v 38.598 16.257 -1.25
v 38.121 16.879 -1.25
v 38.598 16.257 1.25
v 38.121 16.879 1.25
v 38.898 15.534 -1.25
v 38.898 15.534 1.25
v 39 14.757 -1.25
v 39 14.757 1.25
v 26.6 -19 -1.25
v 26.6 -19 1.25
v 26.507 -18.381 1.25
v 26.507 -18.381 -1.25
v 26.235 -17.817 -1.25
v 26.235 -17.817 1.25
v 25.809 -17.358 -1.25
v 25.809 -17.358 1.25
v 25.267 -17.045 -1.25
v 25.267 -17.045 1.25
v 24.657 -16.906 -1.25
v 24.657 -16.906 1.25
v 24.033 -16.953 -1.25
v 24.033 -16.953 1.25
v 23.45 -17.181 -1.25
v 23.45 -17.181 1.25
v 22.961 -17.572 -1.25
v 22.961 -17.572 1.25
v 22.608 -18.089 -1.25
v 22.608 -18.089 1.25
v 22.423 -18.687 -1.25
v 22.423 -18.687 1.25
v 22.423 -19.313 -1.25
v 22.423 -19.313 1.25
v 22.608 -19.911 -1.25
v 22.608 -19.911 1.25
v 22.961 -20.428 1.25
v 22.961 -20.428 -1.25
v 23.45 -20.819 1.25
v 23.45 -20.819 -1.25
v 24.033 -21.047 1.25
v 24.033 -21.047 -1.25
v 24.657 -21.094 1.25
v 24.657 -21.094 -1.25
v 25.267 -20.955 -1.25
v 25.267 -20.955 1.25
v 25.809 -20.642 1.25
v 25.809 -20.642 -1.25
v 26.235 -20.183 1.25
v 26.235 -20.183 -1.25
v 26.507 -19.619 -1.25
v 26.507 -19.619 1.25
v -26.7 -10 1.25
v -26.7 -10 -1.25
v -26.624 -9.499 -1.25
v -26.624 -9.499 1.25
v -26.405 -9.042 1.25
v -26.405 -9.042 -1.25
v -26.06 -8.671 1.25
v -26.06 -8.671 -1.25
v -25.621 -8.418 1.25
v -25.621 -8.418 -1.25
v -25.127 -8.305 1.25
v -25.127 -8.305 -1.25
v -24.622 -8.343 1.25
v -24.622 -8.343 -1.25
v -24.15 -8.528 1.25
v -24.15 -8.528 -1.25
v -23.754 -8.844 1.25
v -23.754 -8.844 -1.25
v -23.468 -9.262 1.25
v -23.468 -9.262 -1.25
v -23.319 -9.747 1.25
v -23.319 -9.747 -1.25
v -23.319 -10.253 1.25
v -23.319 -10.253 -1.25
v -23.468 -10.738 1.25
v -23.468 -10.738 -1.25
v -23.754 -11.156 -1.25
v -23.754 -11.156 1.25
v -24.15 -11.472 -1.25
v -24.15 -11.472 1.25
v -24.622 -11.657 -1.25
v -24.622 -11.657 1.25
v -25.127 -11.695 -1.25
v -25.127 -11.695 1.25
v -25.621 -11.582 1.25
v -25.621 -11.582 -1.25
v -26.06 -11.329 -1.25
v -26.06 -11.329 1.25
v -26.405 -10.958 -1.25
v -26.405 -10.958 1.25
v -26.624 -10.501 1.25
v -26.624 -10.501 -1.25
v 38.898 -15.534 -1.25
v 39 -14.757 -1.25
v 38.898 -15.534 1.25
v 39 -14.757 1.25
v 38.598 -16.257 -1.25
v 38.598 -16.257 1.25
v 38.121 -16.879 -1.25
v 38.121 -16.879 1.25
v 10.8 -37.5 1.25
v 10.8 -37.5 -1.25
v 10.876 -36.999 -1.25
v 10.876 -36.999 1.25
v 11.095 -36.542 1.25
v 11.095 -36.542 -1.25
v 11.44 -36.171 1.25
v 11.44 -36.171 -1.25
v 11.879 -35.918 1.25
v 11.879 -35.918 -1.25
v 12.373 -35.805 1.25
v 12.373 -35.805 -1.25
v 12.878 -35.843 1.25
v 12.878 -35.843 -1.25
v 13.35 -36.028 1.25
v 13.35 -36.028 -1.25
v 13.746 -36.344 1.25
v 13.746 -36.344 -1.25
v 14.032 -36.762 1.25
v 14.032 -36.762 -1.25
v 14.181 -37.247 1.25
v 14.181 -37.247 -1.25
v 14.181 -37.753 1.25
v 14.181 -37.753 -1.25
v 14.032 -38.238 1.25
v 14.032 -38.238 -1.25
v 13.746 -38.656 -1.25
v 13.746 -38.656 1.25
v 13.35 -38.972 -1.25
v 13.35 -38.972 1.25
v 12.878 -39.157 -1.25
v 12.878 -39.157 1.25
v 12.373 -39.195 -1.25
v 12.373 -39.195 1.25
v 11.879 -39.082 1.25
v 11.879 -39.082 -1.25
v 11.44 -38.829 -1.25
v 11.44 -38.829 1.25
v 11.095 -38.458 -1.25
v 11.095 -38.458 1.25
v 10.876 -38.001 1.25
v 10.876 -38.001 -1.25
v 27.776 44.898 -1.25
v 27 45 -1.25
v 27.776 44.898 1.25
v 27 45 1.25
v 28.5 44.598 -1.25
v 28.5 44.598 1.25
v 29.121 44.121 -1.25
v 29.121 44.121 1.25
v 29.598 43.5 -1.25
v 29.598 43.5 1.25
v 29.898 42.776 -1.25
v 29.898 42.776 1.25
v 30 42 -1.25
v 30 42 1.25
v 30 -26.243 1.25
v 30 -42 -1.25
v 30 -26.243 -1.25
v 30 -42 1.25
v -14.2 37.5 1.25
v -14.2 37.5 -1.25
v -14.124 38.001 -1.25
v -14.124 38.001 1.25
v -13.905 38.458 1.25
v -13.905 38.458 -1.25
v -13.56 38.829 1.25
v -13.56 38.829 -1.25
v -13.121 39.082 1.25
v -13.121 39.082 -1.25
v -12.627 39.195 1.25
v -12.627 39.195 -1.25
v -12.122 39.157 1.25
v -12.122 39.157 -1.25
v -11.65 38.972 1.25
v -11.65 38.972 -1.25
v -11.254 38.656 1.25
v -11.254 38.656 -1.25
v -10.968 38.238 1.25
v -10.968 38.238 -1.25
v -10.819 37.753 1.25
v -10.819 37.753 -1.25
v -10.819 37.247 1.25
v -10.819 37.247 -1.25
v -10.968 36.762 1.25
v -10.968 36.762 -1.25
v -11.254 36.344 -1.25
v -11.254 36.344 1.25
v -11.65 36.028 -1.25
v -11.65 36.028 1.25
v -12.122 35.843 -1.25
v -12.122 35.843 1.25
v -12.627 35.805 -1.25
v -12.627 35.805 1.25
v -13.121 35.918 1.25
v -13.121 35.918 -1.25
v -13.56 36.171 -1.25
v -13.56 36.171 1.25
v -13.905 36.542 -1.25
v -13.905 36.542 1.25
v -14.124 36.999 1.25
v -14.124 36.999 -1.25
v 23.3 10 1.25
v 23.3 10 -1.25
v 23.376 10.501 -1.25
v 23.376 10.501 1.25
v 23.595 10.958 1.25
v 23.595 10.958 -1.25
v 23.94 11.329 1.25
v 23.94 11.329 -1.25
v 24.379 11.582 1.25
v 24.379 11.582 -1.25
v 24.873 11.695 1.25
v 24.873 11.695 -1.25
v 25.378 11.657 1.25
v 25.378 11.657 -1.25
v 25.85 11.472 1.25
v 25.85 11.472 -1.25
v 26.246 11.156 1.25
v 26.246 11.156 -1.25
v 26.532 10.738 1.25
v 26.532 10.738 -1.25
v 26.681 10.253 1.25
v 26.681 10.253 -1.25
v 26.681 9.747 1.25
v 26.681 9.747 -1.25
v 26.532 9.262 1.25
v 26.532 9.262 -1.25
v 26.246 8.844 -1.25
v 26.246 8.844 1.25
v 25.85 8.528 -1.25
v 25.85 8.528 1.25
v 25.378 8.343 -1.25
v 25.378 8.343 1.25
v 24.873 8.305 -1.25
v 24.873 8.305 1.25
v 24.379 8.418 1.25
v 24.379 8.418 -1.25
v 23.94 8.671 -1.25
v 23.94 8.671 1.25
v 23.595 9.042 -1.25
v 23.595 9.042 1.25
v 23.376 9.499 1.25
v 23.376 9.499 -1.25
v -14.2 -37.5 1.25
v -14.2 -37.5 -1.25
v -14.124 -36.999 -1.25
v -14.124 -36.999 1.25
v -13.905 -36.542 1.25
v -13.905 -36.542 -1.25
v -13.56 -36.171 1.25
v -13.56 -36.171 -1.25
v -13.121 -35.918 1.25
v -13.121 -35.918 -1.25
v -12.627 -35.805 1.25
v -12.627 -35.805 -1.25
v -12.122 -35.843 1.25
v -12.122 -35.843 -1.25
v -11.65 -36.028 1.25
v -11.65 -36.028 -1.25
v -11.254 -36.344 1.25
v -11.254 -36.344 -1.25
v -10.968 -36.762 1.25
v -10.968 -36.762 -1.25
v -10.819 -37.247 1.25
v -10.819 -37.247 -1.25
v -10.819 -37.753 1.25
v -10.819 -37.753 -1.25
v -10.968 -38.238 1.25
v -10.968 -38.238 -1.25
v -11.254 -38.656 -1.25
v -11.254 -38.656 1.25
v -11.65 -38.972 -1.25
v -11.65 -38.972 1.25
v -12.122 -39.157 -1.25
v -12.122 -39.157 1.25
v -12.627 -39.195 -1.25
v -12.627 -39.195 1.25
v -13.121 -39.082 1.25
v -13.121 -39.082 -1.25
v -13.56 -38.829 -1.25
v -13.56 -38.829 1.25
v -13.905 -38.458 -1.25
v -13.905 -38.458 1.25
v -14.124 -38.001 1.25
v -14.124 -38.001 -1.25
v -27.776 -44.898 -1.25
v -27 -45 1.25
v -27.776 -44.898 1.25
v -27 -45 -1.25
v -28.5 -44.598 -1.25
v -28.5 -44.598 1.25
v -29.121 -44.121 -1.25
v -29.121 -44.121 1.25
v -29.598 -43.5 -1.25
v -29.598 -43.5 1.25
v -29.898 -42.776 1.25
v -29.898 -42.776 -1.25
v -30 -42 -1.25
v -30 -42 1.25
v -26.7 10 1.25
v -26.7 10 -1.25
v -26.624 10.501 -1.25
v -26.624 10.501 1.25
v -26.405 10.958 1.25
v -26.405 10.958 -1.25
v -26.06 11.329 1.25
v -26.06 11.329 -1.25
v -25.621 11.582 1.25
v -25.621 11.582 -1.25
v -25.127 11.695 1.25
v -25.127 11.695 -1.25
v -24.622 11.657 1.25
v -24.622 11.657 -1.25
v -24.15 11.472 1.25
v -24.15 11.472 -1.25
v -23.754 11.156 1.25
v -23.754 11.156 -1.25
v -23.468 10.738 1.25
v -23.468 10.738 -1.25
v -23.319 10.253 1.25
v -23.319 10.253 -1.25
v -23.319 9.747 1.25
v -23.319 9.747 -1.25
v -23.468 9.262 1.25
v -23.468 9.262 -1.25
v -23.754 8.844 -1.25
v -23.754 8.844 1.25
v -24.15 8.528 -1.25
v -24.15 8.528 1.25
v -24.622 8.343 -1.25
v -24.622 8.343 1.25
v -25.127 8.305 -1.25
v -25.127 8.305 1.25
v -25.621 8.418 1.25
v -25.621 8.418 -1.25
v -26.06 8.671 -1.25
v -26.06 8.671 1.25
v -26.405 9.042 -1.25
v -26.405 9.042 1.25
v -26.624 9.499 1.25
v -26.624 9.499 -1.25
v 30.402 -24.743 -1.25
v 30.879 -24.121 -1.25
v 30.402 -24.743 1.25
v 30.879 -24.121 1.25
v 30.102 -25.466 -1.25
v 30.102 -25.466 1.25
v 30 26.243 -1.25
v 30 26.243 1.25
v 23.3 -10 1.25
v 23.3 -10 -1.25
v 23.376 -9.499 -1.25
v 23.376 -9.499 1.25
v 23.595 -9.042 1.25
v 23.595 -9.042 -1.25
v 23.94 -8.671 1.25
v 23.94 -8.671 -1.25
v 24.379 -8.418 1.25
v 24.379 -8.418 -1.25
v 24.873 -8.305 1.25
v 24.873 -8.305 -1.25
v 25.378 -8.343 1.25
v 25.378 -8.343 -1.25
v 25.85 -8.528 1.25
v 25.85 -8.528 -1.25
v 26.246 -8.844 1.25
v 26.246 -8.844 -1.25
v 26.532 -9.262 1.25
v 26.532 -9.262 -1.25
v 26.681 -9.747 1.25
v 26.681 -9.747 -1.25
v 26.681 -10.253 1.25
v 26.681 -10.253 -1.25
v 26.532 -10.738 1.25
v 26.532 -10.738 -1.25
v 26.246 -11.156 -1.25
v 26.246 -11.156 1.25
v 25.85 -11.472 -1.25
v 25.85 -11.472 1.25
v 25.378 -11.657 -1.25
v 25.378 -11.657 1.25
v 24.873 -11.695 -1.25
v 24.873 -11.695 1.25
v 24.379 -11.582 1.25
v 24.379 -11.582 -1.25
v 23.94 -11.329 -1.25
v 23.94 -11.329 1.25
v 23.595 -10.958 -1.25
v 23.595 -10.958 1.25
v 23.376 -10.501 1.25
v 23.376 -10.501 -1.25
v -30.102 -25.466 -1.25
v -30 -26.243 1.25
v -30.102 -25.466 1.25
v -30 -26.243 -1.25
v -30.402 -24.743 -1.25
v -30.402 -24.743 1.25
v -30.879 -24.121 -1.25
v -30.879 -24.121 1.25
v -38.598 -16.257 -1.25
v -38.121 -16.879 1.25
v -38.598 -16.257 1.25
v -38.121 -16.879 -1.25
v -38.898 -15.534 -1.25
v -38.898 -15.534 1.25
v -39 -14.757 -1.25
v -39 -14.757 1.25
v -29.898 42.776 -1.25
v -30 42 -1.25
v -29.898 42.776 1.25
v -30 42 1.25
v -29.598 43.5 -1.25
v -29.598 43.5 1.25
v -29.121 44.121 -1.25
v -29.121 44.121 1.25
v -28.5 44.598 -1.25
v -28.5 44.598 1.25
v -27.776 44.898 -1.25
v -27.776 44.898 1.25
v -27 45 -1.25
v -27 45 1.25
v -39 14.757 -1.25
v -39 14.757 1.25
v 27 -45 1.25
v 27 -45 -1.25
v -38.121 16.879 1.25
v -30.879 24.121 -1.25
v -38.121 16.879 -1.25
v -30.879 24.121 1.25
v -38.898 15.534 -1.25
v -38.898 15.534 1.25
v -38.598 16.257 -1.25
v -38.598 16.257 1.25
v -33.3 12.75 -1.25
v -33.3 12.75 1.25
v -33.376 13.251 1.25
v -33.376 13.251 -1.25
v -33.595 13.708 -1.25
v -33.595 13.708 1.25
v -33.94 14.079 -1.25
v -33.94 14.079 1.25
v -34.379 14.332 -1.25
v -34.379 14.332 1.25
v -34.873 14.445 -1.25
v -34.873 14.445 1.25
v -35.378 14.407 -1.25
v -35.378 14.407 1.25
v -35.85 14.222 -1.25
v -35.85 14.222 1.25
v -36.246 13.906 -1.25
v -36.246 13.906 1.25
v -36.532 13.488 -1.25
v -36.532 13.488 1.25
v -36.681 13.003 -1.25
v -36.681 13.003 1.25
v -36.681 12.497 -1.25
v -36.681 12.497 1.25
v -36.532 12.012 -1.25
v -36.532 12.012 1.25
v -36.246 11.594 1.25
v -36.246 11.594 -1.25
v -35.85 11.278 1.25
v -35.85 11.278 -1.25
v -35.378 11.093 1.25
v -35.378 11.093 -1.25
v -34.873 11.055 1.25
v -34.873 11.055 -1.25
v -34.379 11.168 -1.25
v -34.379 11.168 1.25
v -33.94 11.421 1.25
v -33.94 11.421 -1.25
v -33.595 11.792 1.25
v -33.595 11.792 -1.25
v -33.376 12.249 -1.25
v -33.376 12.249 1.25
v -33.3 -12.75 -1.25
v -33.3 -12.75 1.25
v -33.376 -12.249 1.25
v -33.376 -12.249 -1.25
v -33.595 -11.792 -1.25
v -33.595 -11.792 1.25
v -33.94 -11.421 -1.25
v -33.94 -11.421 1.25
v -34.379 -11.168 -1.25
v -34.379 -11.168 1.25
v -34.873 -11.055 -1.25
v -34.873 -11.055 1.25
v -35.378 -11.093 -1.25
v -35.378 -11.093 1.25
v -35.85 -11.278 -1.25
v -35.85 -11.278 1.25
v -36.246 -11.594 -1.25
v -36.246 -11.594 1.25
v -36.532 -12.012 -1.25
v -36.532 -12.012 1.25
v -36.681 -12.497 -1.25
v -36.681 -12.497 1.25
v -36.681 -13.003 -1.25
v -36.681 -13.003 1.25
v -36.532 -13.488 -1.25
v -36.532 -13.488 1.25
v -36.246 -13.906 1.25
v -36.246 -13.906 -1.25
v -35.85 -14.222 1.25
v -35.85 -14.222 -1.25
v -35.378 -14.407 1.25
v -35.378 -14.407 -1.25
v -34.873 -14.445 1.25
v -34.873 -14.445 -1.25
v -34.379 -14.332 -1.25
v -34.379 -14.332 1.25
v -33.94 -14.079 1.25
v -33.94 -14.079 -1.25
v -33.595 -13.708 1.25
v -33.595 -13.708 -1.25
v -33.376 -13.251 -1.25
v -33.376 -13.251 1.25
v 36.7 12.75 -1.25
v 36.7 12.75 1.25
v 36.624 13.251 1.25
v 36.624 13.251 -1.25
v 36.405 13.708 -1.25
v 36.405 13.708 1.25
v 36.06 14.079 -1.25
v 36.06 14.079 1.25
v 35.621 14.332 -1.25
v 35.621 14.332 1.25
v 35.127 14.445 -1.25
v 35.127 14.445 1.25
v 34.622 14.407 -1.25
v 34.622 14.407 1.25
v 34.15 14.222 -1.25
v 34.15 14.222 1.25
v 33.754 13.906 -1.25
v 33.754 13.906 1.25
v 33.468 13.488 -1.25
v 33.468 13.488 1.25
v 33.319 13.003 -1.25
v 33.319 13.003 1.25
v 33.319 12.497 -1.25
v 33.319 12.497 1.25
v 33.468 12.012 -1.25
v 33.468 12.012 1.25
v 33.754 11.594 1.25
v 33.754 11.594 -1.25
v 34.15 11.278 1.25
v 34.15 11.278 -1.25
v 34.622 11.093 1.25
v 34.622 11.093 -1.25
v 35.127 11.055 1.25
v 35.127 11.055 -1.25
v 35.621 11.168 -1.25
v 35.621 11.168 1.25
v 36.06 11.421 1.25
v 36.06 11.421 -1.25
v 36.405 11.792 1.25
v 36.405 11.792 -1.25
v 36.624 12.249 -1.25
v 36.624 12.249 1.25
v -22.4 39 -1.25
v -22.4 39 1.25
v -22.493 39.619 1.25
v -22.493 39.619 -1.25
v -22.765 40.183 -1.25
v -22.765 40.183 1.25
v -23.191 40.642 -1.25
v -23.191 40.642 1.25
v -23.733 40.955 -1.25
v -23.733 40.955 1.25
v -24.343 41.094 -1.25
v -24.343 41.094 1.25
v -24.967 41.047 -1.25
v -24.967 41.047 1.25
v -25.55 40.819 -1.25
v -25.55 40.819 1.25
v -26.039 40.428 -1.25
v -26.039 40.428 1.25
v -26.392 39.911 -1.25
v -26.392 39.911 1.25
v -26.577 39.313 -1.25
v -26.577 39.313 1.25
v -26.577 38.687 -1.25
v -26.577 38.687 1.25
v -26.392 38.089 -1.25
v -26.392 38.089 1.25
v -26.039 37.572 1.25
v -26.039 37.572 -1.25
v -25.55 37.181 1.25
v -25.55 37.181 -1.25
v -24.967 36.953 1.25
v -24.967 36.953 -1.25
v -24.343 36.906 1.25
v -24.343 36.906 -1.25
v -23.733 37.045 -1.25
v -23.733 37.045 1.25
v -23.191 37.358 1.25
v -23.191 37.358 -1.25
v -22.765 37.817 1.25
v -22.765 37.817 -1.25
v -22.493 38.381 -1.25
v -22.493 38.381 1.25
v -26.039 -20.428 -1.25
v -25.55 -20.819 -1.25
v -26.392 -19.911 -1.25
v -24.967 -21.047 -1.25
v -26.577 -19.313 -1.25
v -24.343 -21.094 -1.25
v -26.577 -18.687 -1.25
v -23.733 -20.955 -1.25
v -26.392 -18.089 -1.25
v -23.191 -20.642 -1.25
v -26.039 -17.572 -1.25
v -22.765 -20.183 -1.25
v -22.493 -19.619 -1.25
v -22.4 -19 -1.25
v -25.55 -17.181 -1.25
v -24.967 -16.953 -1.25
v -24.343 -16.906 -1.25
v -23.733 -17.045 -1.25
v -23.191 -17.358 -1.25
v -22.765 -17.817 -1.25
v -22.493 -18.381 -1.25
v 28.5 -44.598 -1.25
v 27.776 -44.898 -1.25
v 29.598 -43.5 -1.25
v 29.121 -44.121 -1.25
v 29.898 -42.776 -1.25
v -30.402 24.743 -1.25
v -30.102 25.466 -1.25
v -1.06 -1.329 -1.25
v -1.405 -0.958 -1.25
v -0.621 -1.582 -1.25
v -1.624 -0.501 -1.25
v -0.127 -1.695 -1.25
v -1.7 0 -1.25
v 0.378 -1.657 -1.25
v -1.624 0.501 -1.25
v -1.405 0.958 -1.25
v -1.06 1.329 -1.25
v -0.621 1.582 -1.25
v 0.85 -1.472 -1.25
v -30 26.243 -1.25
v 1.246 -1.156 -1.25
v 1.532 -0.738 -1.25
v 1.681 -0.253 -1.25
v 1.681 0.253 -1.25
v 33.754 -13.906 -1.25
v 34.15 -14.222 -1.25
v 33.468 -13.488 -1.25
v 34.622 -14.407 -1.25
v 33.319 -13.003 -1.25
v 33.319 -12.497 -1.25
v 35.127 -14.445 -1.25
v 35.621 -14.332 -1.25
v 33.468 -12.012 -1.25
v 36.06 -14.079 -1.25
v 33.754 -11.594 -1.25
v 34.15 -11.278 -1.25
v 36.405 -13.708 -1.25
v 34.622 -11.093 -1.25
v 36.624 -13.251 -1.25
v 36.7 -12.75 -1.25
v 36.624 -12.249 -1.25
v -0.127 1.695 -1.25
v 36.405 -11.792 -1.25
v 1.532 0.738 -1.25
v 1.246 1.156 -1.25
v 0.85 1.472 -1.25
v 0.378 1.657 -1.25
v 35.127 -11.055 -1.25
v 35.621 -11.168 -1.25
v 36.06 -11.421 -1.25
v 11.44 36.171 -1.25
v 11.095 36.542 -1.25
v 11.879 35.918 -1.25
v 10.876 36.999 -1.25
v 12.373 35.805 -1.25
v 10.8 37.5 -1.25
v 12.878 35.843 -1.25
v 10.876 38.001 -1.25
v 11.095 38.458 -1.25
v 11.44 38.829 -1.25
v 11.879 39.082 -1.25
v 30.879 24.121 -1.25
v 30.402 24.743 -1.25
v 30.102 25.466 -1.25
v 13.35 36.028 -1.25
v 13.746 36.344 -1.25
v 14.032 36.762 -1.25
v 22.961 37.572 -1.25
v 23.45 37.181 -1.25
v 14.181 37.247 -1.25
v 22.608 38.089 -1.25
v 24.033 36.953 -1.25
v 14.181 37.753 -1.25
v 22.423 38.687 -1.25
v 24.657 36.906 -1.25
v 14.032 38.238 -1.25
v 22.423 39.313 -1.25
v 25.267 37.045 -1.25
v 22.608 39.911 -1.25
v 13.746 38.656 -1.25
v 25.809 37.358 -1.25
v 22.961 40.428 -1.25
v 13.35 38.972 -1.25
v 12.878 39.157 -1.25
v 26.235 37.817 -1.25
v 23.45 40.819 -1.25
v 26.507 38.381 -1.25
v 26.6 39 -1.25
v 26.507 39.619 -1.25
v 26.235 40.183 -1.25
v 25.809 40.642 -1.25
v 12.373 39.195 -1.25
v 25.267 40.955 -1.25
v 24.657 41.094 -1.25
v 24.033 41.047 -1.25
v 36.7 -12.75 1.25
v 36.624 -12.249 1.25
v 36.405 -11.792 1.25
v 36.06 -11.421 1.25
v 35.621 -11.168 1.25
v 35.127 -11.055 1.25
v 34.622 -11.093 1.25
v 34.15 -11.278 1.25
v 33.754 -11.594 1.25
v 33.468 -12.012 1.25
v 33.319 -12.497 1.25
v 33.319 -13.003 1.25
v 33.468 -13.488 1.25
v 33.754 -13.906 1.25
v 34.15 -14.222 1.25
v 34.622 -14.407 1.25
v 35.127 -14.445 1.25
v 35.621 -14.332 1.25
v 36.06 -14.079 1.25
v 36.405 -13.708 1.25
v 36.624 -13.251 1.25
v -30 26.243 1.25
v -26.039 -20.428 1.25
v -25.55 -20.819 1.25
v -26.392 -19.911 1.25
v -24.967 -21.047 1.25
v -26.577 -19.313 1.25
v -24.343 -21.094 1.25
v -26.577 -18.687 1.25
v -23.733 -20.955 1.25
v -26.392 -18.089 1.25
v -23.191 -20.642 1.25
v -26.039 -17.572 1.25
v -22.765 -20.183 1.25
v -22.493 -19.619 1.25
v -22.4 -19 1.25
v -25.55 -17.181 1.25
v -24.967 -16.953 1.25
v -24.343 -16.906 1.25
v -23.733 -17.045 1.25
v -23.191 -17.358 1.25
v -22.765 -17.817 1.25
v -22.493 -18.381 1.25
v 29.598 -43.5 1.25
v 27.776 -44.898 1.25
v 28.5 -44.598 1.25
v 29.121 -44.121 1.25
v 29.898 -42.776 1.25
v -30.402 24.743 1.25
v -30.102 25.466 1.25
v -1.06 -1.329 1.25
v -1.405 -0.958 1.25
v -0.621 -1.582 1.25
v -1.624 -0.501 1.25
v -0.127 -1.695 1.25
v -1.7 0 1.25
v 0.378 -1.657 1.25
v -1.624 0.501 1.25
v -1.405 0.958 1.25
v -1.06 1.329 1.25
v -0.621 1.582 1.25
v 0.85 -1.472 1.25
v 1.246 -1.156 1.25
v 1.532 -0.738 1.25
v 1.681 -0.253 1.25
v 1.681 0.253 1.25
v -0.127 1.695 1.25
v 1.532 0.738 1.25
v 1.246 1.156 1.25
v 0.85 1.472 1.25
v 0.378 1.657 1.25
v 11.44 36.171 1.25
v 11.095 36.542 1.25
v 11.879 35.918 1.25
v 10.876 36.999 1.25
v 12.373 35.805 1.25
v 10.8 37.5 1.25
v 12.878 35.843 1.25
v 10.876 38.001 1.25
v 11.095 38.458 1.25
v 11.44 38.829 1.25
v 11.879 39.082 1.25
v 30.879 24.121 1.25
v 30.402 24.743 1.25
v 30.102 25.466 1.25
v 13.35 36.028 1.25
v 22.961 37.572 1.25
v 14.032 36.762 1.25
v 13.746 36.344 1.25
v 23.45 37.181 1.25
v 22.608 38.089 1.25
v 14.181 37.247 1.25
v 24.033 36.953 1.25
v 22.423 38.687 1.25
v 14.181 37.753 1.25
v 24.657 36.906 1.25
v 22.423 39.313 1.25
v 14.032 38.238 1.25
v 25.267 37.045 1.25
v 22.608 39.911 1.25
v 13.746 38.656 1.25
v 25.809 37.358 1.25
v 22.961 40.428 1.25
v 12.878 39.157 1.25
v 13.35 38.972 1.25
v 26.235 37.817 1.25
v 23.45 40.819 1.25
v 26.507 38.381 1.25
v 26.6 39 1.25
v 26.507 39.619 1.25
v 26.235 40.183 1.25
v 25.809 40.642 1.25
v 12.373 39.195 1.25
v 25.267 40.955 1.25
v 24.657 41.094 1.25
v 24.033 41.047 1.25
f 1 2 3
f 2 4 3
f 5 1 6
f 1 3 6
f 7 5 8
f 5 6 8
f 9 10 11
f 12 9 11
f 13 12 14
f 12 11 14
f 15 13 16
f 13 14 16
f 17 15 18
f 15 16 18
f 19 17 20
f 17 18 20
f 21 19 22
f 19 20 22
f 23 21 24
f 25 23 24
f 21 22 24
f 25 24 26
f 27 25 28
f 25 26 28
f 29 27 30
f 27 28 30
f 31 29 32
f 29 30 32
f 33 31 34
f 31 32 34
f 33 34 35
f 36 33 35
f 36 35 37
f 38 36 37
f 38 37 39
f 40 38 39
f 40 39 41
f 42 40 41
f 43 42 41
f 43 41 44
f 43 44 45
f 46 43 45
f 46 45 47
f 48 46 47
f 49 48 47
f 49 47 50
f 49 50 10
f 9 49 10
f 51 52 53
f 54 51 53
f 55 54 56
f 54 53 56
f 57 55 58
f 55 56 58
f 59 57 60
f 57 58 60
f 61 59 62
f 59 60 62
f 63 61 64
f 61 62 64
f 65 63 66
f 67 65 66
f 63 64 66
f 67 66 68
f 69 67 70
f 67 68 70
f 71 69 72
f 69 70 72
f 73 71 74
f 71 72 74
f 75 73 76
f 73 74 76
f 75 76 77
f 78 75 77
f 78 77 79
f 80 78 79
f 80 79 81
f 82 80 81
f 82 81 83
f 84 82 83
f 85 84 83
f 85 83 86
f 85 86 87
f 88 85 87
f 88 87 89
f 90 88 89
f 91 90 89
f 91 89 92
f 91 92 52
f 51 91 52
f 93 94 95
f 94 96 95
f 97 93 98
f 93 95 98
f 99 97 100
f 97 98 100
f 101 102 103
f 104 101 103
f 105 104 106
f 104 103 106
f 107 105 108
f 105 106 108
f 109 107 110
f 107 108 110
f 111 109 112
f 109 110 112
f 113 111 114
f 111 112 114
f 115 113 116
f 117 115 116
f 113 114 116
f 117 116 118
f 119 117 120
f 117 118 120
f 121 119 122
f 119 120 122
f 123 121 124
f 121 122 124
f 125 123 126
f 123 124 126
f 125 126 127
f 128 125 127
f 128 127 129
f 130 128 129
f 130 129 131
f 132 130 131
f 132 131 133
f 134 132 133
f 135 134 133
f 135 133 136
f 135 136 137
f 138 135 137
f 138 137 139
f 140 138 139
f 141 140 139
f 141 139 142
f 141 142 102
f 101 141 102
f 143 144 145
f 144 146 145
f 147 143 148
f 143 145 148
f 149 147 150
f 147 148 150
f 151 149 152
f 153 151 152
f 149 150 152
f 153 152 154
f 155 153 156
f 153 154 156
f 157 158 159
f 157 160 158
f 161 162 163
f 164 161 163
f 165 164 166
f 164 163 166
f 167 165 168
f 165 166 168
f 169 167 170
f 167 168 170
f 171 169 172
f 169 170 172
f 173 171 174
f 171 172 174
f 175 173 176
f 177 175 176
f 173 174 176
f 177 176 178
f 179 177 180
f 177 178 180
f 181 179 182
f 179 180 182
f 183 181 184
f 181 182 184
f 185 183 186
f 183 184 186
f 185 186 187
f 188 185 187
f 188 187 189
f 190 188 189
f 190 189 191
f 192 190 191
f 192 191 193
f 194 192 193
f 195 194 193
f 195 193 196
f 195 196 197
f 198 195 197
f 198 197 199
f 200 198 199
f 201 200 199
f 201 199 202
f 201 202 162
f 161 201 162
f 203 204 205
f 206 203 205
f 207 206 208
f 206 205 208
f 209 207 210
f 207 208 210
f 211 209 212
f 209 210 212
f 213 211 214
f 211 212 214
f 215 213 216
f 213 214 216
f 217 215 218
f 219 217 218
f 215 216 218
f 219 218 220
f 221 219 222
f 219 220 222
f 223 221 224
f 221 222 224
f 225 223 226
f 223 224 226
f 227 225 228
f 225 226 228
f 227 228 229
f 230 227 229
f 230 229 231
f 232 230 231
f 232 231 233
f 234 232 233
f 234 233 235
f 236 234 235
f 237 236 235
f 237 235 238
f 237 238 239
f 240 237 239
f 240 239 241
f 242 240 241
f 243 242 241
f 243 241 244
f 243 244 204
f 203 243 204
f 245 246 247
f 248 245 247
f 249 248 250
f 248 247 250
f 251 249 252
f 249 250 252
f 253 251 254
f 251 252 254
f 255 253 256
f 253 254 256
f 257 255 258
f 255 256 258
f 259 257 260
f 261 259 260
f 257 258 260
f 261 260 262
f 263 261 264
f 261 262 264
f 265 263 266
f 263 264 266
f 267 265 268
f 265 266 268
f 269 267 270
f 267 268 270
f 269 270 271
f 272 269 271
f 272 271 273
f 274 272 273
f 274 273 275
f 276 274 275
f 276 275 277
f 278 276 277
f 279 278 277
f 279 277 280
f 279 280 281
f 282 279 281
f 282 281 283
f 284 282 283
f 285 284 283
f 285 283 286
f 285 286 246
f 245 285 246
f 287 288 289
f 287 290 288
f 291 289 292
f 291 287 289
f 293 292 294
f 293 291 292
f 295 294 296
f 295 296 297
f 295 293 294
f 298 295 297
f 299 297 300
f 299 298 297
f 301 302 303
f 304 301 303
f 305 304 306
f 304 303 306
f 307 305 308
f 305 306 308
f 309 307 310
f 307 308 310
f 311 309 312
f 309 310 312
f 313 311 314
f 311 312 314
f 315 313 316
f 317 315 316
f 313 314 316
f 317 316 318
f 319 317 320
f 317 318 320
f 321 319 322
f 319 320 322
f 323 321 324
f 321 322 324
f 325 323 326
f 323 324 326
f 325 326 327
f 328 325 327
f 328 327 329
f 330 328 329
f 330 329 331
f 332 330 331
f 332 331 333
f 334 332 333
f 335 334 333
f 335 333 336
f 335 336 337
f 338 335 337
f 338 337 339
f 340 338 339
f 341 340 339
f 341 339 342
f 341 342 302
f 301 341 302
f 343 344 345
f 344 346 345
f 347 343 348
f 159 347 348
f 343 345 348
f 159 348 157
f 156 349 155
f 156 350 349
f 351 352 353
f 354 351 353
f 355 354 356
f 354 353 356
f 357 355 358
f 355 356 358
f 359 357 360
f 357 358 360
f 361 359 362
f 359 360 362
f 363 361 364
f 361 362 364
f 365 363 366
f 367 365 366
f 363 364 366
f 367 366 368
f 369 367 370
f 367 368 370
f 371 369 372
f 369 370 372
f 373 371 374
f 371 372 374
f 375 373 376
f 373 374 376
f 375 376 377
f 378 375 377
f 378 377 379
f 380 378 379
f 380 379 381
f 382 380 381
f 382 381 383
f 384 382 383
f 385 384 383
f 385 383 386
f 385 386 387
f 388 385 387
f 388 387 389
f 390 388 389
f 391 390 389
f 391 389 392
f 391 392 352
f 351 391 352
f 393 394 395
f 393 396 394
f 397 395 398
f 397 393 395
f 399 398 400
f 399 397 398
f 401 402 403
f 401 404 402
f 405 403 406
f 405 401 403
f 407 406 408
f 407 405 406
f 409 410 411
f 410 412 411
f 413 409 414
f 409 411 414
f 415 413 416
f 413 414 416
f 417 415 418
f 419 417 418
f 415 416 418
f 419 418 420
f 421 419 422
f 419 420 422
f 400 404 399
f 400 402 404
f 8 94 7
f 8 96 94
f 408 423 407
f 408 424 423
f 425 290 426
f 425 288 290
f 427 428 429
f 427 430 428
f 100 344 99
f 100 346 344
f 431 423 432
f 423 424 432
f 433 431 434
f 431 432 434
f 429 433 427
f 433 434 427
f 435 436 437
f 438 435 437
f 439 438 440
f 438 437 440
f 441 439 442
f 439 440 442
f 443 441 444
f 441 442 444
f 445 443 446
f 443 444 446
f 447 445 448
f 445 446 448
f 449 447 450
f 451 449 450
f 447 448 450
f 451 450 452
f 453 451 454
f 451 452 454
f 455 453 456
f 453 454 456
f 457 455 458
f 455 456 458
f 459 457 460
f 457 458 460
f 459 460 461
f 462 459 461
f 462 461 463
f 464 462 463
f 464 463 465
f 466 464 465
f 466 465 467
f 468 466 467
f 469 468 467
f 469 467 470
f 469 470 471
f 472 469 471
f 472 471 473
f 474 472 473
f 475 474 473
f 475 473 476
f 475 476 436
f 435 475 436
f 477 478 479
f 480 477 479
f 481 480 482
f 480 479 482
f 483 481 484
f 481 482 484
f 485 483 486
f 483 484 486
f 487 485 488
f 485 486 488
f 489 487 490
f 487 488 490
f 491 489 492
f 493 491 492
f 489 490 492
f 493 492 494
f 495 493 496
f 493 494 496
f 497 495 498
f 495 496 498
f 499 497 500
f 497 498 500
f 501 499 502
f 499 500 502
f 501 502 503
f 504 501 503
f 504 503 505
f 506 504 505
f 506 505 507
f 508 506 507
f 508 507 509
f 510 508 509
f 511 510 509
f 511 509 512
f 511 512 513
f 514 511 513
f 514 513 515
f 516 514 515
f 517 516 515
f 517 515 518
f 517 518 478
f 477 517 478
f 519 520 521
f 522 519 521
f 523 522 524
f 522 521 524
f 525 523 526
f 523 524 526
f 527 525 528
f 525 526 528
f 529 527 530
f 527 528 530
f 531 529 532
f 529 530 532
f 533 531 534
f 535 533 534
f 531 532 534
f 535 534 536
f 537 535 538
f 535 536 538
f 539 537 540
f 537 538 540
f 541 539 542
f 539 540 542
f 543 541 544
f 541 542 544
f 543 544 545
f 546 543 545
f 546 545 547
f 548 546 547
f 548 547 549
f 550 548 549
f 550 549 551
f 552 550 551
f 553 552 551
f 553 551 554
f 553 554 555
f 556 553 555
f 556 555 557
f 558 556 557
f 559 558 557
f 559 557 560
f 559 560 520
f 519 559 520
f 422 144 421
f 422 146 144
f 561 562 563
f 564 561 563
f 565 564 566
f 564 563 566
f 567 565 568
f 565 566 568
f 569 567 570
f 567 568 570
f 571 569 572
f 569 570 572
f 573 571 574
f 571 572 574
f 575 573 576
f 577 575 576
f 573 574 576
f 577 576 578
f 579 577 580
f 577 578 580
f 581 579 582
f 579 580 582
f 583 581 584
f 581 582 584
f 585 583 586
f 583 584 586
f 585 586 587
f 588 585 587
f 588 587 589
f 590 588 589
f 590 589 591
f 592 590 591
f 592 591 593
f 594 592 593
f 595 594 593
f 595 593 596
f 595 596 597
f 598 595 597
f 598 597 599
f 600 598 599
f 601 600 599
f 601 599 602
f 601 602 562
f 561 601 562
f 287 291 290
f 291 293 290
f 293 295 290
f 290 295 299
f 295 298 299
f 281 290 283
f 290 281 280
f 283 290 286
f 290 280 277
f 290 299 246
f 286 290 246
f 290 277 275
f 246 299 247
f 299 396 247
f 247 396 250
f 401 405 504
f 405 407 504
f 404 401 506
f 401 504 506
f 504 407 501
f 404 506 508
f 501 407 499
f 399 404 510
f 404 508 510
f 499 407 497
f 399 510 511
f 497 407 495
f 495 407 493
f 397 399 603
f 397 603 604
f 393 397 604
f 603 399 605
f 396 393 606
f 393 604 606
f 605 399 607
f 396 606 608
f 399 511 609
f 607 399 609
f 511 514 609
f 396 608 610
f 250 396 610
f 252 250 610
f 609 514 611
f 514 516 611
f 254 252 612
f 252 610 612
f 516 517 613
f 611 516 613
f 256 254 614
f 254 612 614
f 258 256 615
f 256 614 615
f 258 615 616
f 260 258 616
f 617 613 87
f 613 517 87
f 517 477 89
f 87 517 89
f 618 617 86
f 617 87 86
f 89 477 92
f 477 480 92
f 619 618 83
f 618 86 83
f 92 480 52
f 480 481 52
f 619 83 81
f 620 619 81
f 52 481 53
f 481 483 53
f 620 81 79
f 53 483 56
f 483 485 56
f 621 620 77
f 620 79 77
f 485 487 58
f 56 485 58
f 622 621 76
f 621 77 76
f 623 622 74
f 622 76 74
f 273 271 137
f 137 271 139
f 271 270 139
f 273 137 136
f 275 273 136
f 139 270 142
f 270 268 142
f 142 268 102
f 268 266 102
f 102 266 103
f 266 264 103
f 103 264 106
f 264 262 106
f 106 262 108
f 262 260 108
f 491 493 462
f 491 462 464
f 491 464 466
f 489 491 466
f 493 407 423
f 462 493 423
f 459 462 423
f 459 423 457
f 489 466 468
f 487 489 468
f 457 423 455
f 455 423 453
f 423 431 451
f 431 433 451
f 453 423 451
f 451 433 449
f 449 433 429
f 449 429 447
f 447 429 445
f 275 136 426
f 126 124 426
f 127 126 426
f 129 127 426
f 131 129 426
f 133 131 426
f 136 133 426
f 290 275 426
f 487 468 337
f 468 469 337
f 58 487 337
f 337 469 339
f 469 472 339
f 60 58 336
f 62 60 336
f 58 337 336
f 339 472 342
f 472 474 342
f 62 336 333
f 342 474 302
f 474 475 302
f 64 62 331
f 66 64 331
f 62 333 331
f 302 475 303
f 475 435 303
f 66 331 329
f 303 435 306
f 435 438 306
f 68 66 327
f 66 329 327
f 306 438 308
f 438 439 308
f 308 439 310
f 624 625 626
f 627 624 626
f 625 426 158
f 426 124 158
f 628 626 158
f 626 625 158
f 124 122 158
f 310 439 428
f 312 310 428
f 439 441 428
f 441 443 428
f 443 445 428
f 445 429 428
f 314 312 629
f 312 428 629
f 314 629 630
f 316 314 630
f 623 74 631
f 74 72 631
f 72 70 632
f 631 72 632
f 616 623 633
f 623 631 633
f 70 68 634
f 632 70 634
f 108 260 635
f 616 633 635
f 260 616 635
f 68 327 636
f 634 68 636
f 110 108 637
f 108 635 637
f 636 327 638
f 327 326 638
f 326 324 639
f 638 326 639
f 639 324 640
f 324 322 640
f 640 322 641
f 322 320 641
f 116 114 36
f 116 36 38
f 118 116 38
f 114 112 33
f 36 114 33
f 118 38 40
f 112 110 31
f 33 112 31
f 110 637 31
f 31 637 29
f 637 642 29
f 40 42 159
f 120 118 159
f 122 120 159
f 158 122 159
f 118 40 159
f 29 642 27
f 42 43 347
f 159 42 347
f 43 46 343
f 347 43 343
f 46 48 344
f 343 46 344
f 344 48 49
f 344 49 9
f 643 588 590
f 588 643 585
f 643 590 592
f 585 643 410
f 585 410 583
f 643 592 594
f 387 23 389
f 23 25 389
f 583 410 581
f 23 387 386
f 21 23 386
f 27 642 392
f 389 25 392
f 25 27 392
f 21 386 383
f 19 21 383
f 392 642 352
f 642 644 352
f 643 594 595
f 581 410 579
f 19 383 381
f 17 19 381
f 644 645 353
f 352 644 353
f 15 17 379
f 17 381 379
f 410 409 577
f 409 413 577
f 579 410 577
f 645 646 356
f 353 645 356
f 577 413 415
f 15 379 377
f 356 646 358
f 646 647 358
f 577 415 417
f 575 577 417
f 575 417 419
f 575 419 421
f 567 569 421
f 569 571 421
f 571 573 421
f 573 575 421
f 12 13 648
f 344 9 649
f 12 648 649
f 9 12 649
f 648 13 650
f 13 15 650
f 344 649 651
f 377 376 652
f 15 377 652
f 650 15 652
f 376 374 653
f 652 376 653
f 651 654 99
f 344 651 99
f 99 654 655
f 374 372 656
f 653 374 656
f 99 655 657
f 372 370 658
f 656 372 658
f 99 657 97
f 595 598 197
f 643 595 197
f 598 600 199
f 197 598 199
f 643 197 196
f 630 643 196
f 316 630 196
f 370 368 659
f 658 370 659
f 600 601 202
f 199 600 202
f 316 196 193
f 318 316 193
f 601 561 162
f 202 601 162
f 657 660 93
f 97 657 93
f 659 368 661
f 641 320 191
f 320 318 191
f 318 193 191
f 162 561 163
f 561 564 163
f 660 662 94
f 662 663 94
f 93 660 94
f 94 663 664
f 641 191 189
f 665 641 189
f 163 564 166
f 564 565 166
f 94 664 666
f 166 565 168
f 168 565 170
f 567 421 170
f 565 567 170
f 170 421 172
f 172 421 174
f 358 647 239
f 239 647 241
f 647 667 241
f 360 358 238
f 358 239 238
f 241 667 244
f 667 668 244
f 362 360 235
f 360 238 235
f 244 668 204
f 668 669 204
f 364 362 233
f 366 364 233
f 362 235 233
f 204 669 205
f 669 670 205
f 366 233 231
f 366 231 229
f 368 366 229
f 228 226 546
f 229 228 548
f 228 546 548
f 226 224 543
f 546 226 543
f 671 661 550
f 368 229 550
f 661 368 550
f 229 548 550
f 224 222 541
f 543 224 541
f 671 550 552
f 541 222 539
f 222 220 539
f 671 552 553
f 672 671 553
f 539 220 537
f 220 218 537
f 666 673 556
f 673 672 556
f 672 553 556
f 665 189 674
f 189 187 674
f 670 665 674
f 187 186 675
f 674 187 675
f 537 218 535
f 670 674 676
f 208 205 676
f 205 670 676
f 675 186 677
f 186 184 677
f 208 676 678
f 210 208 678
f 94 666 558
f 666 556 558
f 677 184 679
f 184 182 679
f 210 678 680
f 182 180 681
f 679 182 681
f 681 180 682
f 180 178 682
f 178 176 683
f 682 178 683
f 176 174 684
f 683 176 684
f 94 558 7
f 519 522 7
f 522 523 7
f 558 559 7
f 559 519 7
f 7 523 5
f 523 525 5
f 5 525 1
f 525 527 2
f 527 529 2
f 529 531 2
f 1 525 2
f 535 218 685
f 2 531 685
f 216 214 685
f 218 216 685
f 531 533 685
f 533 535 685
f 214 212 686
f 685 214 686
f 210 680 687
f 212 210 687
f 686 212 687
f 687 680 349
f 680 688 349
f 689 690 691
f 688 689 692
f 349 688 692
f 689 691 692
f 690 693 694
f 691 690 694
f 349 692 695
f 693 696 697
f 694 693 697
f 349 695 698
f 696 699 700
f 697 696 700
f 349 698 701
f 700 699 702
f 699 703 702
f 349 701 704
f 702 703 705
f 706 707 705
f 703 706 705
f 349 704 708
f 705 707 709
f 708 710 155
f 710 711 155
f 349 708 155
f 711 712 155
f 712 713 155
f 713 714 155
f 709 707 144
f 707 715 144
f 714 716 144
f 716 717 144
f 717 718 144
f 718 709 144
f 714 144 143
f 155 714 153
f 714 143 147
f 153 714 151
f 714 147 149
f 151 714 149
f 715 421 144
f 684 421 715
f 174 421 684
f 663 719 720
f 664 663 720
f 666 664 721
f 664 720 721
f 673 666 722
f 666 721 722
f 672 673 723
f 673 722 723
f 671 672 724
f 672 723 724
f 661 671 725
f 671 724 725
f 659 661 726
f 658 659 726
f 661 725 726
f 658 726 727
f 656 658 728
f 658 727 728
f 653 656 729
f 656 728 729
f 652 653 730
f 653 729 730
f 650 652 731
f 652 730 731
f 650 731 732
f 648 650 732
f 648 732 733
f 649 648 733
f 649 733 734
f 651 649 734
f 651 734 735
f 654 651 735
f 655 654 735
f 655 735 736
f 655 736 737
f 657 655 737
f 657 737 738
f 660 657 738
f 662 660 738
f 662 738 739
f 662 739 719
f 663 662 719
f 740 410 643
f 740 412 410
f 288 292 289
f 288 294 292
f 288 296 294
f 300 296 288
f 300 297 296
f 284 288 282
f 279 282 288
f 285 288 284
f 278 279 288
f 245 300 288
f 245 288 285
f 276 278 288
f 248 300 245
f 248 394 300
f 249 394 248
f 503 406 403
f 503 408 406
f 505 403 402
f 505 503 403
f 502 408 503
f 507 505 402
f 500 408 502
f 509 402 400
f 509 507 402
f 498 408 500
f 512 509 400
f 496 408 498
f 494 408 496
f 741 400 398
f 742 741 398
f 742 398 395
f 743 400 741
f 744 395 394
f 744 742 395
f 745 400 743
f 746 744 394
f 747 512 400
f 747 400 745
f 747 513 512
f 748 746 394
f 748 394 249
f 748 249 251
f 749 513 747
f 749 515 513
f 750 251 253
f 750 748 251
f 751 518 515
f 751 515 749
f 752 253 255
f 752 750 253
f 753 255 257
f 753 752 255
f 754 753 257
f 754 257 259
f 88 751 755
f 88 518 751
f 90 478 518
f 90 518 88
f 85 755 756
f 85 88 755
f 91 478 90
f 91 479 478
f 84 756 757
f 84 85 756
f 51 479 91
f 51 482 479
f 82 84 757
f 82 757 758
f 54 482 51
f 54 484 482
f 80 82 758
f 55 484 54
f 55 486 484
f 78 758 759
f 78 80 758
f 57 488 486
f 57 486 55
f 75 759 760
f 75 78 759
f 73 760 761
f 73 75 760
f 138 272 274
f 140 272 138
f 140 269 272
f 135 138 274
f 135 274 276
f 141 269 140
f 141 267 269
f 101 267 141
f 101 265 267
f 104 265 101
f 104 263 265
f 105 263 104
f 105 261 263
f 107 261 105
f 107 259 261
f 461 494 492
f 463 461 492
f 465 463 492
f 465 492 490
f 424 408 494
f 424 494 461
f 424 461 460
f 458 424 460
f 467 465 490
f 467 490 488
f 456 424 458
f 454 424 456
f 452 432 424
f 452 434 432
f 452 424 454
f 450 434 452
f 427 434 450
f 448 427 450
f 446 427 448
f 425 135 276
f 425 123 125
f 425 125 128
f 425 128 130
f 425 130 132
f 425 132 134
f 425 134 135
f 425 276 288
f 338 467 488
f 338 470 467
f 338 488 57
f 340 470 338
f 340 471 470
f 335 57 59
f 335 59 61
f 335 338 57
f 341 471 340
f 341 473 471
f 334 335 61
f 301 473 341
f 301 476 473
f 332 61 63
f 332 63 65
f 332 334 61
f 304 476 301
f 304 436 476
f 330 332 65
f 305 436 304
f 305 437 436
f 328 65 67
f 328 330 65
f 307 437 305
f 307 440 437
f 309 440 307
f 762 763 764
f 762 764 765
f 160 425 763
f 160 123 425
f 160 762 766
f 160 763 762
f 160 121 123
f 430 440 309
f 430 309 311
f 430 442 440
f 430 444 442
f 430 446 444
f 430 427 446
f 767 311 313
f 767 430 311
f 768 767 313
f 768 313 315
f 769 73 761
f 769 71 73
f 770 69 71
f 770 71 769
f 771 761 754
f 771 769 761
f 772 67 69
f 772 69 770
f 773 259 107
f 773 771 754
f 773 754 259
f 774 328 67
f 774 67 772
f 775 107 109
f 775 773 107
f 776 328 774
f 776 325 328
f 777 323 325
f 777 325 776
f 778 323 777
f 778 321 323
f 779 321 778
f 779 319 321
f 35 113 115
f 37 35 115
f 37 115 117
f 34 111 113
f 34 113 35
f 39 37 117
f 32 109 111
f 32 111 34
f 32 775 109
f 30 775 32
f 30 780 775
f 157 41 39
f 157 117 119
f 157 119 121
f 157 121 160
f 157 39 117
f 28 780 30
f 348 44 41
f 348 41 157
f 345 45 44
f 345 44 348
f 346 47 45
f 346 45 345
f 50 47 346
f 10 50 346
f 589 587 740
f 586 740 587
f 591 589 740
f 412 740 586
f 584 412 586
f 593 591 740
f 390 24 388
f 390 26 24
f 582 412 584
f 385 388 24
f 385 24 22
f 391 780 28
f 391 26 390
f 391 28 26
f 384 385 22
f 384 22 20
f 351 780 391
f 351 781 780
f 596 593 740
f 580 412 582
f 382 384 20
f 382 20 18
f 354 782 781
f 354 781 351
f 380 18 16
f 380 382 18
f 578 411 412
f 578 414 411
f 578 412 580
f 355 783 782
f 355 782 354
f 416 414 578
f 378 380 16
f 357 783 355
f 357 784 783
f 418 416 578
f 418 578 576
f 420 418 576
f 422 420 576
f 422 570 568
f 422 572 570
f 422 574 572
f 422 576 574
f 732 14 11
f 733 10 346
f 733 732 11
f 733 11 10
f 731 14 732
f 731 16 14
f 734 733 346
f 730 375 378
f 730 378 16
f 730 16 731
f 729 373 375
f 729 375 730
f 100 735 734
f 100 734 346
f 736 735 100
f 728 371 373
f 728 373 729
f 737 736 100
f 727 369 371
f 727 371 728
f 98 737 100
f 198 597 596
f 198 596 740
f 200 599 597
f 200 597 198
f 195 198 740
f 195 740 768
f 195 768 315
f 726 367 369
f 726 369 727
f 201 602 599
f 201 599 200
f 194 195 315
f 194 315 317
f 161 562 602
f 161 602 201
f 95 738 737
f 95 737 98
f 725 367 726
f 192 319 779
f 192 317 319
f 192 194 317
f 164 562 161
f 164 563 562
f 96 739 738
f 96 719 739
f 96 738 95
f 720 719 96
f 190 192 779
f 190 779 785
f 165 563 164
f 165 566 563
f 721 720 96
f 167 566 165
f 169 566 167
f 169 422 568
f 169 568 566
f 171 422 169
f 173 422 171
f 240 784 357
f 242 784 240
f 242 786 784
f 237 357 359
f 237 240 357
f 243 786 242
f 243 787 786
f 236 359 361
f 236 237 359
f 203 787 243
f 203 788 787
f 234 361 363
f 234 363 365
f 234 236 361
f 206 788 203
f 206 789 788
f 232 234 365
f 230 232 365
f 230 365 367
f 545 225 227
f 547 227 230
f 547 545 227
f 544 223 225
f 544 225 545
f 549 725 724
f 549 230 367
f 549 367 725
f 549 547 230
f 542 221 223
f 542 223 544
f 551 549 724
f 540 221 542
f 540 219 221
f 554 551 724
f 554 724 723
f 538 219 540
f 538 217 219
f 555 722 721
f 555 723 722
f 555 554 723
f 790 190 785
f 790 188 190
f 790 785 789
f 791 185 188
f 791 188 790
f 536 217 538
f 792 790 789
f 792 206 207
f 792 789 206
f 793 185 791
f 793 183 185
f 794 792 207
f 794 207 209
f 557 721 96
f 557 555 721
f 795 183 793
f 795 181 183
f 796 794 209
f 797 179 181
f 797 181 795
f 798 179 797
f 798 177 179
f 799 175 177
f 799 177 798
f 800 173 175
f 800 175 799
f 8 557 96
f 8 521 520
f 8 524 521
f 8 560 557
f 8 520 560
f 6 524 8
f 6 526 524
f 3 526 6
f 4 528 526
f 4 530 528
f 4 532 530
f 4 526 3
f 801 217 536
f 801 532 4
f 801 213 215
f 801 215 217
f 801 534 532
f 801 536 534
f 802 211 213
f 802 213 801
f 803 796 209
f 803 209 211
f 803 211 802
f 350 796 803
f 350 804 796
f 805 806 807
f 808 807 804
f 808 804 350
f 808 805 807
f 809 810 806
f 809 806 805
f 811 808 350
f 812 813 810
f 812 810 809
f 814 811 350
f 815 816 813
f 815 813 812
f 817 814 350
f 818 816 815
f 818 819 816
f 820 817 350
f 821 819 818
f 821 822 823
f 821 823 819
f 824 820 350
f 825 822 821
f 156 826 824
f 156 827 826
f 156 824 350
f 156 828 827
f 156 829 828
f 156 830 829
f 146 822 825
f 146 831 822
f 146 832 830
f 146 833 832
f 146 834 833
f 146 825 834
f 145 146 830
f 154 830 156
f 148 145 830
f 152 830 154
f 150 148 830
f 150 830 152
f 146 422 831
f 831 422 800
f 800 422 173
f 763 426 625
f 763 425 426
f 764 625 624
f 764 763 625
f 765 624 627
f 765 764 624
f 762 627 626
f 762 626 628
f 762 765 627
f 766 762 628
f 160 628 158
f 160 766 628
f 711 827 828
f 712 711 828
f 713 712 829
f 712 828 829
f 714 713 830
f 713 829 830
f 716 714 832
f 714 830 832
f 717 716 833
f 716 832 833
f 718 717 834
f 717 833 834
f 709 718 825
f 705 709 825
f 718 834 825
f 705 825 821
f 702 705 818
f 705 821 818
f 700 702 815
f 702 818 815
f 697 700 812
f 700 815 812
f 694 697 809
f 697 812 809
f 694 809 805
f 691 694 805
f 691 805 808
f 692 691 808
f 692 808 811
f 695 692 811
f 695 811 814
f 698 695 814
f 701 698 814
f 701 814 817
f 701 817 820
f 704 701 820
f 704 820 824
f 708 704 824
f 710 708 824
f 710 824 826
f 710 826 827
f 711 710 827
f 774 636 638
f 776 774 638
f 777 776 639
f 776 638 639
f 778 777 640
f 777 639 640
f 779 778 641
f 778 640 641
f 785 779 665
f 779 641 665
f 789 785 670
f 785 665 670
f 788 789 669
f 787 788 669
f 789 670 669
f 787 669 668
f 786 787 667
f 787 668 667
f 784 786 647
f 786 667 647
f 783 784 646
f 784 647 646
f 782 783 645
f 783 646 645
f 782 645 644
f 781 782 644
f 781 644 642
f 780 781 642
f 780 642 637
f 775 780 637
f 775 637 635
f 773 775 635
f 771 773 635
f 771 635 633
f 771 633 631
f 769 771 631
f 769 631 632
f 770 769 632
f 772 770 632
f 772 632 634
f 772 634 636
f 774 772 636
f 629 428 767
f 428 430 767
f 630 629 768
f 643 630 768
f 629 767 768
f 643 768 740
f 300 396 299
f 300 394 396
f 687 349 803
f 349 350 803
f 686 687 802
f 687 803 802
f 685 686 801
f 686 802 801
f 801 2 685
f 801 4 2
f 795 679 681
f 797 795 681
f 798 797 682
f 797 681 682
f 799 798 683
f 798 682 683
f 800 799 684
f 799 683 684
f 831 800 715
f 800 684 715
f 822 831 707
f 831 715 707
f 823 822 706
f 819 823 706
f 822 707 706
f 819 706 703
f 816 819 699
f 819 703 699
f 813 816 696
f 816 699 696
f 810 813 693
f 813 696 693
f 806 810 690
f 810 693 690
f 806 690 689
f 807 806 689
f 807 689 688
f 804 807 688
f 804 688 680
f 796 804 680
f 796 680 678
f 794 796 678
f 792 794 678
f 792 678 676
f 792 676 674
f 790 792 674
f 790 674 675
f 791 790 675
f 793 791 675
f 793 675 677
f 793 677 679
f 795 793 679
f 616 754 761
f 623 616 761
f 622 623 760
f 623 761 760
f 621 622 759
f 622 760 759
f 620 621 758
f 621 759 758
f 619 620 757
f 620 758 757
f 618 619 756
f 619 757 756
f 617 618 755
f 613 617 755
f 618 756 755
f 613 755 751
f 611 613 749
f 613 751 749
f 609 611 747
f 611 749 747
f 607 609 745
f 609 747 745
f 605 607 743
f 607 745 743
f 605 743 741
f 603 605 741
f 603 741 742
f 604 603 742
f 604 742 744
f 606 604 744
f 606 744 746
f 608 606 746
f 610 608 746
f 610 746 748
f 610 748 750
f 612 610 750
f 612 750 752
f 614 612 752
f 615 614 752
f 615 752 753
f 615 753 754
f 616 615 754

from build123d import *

# Parameters (mm, degrees)
SKETCH1_W                  = 60
SKETCH1_H                  = 90
BOSS_EXTRUDE1_DEPTH        = 1.25
FILLET1_R                  = 3
F_4_2_4_2_DIAMETER_HOLE1_D = 4.2
M3_CLEARANCE_HOLE1_D       = 3.4
M3_CLEARANCE_HOLE2_D       = 3.4
M3_CLEARANCE_HOLE3_D       = 3.4


with BuildPart() as part:
    # Sketch1 → Boss-Extrude1 (new, symmetric)
    with BuildSketch(Plane.XY):
        Polygon((-30, 25), (-30, -25), (-30, -45), (30, -45), (30, -25), (30, 25), (30, 45), (-30, 45), align=None)
        Rectangle(SKETCH1_W, SKETCH1_H)
        Polygon((-39, 16), (-39, -16), (-30, -25), (-30, 25), align=None)
        Polygon((30, 25), (30, -25), (39, -16), (39, 16), align=None)
    extrude(amount=BOSS_EXTRUDE1_DEPTH, both=True)

    # Fillet1
    fillet1_edges = [part.edges().sort_by_distance(p)[0] for p in [
        (30, 25, 0),
        (39, 16, 0),
        (39, -16, 0),
        (30, -25, 0),
        (30, -45, 0),
        (-30, -45, 0),
        (-30, -25, 0),
        (-39, -16, 0),
        (-39, 16, 0),
        (-30, 25, 0),
        (-30, 45, 0),
        (30, 45, 0),
    ]]
    fillet(fillet1_edges, radius=FILLET1_R)

    # Ø4.2 (4.2) Diameter Hole1 (through all)
    with Locations(Plane(origin=(0, 0, -1.25), x_dir=(-1, 0, 0), z_dir=(0, 0, -1))):
        with Locations((-24.5, -19), (24.5, -19), (24.5, 39), (-24.5, 39)):
            Hole(F_4_2_4_2_DIAMETER_HOLE1_D / 2)

    # M3 Clearance Hole1 (through all)
    with Locations(Plane(origin=(0, 0, -1.25), x_dir=(-1, 0, 0), z_dir=(0, 0, -1))):
        with Locations((-35, 12.75), (-35, -12.75), (35, -12.75), (35, 12.75)):
            Hole(M3_CLEARANCE_HOLE1_D / 2)

    # M3 Clearance Hole2 (through all)
    with Locations(Plane.XY.offset(1.25)):
        with Locations((-12.5, -37.5), (12.5, -37.5), (-12.5, 37.5), (12.5, 37.5), (-25, 10), (-25, -10), (25, -10), (25, 10)):
            Hole(M3_CLEARANCE_HOLE2_D / 2)

    # M3 Clearance Hole3 (through all)
    with Locations(Plane.XY.offset(1.25)):
        with Locations((0, 0)):
            Hole(M3_CLEARANCE_HOLE3_D / 2)


solid = part.part
